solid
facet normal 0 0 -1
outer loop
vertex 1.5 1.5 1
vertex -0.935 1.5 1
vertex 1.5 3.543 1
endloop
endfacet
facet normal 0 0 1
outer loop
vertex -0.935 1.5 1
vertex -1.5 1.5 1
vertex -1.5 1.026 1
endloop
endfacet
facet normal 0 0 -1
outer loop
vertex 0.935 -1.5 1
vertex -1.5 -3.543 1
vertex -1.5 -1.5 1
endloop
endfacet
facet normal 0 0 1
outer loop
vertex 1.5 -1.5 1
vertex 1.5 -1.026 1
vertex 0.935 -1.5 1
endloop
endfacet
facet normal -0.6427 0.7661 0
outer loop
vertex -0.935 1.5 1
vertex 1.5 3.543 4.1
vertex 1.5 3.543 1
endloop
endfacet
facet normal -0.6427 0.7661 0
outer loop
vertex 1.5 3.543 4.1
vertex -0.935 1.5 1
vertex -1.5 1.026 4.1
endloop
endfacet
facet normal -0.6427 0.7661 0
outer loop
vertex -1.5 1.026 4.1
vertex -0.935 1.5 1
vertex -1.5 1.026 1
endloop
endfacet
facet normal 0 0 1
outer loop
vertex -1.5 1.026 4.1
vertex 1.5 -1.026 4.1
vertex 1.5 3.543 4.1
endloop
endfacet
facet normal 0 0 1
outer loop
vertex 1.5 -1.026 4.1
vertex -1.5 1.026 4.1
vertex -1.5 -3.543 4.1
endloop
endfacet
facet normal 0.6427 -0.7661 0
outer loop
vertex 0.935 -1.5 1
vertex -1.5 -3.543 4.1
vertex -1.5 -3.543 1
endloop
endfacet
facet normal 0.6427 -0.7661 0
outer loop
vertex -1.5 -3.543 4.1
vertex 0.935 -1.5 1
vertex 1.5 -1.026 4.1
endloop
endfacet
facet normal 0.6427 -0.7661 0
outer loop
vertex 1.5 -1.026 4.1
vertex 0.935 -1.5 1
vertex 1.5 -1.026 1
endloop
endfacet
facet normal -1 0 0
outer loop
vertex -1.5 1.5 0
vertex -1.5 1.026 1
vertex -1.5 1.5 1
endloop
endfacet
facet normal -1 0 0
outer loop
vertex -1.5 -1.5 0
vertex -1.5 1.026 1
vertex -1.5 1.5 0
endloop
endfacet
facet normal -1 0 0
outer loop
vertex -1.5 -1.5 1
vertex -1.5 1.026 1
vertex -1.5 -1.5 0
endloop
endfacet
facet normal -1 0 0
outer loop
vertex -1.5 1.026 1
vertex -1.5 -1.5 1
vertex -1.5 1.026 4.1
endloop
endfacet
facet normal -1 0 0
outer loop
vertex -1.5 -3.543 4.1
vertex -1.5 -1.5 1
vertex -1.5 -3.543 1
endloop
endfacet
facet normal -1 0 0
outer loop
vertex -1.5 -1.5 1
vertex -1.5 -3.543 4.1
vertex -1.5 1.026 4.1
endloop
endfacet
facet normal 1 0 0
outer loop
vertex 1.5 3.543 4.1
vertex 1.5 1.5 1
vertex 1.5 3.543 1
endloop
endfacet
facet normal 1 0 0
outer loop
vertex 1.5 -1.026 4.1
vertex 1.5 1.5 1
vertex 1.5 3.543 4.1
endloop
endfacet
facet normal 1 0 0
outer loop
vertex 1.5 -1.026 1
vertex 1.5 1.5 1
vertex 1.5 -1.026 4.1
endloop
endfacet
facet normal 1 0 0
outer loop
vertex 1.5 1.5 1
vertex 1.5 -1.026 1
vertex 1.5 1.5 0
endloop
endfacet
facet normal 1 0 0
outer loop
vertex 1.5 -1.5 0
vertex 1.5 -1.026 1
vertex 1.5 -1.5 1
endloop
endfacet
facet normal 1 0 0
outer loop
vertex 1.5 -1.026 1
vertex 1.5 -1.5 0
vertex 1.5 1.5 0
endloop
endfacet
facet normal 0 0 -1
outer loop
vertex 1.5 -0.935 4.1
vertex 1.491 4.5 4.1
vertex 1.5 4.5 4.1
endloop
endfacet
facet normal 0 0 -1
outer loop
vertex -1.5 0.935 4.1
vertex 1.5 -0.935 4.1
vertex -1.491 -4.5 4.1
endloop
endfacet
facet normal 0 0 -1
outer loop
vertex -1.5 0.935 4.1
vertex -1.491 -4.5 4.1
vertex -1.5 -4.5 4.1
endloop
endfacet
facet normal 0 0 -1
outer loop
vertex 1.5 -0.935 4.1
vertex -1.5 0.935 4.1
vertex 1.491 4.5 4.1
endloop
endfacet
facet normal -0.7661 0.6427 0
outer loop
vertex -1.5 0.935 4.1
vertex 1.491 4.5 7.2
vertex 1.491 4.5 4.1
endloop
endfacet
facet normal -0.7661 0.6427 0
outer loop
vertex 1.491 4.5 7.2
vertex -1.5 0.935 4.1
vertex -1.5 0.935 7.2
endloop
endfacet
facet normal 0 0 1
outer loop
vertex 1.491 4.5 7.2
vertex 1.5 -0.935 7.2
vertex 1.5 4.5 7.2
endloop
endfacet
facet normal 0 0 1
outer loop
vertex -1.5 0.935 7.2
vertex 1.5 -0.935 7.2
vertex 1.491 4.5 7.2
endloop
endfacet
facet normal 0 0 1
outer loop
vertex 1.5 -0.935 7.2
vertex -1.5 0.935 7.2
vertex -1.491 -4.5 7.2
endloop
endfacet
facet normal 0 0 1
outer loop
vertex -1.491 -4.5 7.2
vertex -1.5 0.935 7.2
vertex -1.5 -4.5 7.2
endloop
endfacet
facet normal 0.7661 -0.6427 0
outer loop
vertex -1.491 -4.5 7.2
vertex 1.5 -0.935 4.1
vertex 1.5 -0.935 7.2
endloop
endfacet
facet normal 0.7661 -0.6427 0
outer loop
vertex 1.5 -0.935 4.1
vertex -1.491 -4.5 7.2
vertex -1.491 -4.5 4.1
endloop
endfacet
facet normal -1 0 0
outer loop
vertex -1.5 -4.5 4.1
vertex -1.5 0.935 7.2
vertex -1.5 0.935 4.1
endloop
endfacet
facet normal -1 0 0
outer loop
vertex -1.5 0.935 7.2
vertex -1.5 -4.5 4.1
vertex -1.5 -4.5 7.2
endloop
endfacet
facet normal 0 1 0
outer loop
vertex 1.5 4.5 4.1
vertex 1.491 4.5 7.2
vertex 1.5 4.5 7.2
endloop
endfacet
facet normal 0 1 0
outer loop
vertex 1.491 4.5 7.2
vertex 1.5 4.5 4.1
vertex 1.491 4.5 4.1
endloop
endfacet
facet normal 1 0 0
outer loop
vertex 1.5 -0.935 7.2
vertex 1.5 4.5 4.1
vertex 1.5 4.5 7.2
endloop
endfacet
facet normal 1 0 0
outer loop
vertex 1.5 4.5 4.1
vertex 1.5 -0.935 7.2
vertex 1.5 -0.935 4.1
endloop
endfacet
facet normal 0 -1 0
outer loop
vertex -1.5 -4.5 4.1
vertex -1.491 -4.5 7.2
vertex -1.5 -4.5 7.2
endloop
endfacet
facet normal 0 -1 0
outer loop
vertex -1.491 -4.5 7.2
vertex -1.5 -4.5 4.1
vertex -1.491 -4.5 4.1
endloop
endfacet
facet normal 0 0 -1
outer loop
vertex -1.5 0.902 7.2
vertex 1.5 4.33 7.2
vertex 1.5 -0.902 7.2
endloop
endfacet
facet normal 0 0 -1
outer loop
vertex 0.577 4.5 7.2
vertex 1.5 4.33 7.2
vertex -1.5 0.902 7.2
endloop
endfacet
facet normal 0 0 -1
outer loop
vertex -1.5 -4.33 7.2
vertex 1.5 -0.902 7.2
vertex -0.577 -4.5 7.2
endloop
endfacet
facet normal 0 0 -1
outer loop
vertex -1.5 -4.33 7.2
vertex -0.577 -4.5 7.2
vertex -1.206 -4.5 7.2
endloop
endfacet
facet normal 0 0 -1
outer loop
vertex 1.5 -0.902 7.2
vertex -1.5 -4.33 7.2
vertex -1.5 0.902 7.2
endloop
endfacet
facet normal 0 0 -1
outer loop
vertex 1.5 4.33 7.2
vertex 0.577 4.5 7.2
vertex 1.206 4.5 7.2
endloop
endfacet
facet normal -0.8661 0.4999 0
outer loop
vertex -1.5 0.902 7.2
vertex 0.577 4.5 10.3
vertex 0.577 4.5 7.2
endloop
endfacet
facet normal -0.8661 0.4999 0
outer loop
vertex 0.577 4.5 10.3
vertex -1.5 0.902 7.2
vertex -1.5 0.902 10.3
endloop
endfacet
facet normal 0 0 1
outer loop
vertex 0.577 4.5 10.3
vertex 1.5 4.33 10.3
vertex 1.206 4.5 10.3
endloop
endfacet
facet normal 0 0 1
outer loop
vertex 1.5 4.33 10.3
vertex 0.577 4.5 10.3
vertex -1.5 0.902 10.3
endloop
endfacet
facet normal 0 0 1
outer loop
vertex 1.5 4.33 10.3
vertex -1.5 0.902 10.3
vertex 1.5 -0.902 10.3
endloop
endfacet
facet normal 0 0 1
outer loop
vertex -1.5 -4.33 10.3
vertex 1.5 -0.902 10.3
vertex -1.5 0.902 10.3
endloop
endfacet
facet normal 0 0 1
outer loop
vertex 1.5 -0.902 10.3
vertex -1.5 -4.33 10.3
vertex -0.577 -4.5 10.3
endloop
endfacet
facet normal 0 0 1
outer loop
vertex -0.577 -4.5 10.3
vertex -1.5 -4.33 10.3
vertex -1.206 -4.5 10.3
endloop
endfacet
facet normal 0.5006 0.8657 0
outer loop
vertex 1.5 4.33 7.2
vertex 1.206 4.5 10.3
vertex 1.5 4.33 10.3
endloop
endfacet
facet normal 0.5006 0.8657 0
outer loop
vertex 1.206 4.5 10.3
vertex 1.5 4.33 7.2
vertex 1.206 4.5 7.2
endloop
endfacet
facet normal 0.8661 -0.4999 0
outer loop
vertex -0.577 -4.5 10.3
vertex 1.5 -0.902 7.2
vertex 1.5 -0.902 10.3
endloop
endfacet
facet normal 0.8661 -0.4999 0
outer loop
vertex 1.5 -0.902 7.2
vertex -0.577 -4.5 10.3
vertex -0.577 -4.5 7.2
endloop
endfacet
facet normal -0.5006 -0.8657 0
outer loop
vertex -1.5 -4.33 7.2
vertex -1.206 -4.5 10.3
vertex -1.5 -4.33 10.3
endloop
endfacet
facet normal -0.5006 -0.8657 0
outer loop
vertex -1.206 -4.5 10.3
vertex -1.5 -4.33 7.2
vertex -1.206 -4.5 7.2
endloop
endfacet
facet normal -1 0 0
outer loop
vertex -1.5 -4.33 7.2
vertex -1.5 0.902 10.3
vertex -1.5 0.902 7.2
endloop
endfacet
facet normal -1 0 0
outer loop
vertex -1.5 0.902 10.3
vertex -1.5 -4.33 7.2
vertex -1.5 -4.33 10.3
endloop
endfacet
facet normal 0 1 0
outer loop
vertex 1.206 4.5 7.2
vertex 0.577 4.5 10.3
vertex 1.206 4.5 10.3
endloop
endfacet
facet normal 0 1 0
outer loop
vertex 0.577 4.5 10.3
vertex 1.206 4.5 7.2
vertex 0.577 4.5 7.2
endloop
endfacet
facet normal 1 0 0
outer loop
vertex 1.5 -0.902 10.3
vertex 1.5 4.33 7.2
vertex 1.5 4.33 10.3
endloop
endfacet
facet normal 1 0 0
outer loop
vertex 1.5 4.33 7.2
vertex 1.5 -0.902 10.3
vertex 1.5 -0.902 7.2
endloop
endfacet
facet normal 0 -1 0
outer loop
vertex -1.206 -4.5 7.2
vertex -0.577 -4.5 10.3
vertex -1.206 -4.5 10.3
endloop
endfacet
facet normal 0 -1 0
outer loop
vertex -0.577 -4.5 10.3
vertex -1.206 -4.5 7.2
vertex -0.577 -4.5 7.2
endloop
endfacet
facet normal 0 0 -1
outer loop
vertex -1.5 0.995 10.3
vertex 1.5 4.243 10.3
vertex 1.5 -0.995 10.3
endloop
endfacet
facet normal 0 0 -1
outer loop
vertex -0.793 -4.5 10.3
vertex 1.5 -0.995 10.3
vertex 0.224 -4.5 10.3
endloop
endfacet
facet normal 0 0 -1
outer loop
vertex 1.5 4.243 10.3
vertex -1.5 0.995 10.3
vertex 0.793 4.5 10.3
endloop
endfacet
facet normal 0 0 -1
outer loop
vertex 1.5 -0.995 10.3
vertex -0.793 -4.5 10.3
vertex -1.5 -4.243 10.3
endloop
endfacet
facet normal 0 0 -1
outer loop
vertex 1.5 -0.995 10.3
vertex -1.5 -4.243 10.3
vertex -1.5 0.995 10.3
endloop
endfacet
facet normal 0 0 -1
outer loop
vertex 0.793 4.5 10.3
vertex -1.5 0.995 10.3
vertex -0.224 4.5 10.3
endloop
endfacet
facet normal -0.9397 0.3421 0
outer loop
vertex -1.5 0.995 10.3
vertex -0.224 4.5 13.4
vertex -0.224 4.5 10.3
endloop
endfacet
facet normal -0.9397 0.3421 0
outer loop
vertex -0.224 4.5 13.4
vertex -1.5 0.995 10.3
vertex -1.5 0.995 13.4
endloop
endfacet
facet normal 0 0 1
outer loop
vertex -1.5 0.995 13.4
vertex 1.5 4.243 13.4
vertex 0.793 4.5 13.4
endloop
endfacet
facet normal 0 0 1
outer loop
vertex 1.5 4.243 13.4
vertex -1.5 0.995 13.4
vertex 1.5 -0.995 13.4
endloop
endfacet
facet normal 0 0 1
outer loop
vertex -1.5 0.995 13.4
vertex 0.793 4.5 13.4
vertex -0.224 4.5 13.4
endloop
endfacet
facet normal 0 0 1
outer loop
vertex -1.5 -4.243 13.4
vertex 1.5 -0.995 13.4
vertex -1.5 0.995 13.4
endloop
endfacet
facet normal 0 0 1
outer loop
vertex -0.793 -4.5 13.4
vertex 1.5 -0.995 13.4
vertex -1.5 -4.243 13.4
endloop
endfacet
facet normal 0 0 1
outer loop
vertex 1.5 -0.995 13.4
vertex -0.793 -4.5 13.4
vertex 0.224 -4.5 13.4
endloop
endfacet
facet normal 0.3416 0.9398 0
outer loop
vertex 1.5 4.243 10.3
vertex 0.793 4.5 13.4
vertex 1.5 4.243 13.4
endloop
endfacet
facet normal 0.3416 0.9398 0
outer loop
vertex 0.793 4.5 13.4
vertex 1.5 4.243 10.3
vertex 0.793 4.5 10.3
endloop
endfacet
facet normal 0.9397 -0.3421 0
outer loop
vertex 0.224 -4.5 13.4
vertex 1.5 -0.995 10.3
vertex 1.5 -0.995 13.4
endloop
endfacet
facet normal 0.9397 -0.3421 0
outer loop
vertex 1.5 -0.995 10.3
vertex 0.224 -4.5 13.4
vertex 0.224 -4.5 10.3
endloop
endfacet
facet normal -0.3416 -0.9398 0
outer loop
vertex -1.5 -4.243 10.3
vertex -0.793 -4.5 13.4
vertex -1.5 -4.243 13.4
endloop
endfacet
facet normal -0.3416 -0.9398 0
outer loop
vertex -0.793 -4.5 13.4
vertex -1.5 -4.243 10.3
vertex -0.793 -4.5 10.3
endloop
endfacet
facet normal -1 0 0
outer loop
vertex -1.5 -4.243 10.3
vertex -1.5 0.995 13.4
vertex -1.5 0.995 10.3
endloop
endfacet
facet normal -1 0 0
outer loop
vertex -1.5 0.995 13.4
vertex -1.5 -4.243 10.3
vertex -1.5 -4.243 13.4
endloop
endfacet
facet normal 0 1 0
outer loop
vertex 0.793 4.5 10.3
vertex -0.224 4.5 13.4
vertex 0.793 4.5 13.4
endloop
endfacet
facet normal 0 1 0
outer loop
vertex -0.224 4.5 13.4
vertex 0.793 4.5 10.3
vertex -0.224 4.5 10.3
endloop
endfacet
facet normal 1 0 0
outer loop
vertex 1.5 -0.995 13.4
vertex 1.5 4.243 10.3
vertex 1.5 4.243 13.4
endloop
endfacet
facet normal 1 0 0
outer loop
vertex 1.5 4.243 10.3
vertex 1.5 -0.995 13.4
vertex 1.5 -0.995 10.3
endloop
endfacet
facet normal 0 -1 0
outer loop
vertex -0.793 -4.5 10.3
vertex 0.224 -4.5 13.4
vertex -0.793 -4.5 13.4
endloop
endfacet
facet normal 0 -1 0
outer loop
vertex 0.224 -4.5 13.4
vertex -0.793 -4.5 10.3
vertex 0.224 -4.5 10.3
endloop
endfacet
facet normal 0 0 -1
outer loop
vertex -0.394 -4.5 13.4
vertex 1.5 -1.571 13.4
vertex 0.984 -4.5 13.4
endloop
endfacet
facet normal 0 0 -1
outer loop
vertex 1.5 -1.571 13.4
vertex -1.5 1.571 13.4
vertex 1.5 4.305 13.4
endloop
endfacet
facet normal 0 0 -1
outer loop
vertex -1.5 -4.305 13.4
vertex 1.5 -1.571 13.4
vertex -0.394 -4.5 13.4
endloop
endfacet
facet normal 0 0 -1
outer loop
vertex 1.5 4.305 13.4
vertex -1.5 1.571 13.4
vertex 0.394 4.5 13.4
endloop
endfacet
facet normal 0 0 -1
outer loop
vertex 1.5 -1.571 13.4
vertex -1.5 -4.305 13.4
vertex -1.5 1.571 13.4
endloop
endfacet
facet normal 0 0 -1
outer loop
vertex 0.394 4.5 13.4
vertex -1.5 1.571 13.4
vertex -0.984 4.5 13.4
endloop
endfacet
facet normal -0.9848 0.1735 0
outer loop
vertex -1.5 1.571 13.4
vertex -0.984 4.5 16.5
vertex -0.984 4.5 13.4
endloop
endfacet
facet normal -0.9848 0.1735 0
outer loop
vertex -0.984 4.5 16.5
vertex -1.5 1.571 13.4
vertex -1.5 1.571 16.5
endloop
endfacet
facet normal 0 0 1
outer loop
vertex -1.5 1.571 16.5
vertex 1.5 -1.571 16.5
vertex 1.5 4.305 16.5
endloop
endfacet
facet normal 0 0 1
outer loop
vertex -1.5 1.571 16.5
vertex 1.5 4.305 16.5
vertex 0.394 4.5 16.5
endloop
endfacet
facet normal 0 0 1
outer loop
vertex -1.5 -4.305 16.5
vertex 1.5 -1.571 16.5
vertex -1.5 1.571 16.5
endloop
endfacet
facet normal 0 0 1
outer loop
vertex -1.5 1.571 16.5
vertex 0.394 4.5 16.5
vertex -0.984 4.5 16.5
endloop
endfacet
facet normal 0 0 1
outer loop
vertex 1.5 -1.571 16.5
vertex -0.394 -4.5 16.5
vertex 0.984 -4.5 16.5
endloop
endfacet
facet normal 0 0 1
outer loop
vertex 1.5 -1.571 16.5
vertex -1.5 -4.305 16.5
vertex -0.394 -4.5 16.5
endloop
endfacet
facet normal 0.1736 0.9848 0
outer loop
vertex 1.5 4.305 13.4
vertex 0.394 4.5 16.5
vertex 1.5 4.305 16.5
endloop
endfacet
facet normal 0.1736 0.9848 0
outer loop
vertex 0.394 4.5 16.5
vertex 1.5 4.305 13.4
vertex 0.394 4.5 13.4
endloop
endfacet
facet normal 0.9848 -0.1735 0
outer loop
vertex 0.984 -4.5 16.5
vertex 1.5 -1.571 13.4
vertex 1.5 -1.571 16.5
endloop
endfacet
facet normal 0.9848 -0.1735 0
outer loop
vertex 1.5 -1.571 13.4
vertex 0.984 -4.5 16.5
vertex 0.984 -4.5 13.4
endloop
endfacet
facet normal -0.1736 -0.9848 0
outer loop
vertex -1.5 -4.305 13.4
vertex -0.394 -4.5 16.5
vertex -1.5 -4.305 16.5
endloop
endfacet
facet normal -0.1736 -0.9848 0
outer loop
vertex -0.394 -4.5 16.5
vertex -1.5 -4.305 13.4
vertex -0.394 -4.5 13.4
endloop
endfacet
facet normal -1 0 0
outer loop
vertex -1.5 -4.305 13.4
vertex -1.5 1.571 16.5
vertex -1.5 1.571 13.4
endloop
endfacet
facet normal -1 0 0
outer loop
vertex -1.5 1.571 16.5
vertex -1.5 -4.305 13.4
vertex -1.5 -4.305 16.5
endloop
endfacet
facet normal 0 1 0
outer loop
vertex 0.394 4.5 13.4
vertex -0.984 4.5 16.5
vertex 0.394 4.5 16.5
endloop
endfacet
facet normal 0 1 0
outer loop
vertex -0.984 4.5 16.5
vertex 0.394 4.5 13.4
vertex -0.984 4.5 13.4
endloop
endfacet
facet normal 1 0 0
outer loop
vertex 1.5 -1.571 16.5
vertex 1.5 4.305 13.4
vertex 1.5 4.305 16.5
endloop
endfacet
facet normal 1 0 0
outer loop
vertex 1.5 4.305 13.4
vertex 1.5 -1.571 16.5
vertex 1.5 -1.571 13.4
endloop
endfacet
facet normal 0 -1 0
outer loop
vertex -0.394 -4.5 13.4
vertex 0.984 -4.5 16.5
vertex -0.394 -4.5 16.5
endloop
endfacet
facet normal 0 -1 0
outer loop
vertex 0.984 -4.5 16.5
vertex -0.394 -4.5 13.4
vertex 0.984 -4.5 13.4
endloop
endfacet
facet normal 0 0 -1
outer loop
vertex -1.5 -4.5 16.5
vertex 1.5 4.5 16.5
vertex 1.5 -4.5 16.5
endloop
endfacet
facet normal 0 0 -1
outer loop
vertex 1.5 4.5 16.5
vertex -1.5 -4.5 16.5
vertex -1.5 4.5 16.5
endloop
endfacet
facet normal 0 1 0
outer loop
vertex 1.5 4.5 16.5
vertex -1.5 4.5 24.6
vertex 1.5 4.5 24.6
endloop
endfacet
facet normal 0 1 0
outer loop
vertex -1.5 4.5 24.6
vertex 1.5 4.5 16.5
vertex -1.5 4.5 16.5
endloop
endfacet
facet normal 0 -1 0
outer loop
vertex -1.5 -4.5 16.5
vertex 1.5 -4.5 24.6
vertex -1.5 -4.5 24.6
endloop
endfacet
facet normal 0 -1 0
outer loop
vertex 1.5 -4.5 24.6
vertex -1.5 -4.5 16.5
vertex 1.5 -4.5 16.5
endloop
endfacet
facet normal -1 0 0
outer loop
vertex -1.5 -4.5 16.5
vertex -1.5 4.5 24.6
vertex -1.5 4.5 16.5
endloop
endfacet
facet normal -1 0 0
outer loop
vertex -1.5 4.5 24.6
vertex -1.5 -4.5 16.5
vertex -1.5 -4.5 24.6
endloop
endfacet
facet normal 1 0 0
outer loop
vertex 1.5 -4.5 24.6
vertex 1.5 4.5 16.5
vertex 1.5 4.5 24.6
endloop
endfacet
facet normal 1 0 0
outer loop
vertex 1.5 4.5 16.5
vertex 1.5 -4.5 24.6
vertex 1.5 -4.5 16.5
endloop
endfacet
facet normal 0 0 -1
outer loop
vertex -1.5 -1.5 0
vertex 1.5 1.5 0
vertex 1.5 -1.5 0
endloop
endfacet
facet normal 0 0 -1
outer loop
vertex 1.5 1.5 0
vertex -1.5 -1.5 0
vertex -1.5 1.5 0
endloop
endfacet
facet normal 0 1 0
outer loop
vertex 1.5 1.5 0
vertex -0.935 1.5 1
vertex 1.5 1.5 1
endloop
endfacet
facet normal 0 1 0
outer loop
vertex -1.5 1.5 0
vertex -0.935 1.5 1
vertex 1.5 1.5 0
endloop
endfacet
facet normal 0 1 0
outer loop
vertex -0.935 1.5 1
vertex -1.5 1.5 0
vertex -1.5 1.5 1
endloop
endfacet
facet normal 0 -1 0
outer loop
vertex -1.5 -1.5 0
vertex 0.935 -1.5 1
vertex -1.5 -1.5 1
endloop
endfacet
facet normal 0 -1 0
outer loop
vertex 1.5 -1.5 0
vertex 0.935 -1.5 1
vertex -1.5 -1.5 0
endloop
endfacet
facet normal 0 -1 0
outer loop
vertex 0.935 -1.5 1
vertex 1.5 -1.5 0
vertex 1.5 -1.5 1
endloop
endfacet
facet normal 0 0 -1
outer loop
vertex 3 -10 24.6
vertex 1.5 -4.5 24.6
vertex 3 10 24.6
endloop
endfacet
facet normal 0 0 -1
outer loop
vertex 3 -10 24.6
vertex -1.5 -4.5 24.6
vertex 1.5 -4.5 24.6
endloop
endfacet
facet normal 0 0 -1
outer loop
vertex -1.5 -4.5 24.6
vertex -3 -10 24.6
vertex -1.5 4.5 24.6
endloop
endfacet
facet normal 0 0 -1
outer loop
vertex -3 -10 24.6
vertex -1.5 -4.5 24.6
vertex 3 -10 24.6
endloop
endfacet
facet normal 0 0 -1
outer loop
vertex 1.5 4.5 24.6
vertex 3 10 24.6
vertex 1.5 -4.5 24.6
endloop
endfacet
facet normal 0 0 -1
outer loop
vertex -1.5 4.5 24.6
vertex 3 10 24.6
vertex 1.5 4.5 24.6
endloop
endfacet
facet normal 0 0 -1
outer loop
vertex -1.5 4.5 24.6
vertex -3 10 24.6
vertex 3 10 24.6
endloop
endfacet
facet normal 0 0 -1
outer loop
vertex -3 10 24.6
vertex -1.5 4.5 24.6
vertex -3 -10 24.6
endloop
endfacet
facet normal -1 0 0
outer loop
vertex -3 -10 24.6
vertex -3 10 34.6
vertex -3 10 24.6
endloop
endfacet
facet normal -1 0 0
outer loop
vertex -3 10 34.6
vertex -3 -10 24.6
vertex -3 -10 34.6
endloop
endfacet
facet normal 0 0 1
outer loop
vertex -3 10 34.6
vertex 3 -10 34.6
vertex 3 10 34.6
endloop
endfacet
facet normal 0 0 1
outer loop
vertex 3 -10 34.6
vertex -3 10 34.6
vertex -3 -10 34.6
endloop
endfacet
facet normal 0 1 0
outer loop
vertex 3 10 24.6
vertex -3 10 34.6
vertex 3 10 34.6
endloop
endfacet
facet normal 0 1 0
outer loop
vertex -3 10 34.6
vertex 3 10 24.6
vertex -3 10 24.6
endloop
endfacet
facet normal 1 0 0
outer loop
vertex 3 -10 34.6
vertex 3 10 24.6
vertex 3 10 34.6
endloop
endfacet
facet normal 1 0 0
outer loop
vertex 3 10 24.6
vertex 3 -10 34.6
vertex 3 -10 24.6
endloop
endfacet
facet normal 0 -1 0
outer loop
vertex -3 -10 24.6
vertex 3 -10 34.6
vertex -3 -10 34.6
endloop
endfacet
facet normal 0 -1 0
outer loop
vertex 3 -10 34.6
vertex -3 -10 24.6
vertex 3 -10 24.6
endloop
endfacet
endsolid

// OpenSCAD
pinning = [4,5,6,7,8,9];
key();

module key() {

    // Cuts
    for (i=[0:len(pinning)-1]) {
        translate([0,0,1+(3.1*i)])
        keycut(pinning[i]);
    }

    // Bottom Spacer
    linear_extrude(1) 
    square([3,3], center=true);

    // Handle
    translate([0,0,1+(3.1*len(pinning))])
    linear_extrude(5) 
    square([3,9], center=true);

    translate([0,0,6+(3.1*len(pinning))])
    linear_extrude(10) 
    square([6,20], center=true);

}

module keycut(i) {
    intersection() {
        rotate([0,0,-(90-10*i)])
        linear_extrude(3.1) 
        square([3.5,9], center=true);
        linear_extrude(3.1) 
        square([3,9], center=true);
    }
}
